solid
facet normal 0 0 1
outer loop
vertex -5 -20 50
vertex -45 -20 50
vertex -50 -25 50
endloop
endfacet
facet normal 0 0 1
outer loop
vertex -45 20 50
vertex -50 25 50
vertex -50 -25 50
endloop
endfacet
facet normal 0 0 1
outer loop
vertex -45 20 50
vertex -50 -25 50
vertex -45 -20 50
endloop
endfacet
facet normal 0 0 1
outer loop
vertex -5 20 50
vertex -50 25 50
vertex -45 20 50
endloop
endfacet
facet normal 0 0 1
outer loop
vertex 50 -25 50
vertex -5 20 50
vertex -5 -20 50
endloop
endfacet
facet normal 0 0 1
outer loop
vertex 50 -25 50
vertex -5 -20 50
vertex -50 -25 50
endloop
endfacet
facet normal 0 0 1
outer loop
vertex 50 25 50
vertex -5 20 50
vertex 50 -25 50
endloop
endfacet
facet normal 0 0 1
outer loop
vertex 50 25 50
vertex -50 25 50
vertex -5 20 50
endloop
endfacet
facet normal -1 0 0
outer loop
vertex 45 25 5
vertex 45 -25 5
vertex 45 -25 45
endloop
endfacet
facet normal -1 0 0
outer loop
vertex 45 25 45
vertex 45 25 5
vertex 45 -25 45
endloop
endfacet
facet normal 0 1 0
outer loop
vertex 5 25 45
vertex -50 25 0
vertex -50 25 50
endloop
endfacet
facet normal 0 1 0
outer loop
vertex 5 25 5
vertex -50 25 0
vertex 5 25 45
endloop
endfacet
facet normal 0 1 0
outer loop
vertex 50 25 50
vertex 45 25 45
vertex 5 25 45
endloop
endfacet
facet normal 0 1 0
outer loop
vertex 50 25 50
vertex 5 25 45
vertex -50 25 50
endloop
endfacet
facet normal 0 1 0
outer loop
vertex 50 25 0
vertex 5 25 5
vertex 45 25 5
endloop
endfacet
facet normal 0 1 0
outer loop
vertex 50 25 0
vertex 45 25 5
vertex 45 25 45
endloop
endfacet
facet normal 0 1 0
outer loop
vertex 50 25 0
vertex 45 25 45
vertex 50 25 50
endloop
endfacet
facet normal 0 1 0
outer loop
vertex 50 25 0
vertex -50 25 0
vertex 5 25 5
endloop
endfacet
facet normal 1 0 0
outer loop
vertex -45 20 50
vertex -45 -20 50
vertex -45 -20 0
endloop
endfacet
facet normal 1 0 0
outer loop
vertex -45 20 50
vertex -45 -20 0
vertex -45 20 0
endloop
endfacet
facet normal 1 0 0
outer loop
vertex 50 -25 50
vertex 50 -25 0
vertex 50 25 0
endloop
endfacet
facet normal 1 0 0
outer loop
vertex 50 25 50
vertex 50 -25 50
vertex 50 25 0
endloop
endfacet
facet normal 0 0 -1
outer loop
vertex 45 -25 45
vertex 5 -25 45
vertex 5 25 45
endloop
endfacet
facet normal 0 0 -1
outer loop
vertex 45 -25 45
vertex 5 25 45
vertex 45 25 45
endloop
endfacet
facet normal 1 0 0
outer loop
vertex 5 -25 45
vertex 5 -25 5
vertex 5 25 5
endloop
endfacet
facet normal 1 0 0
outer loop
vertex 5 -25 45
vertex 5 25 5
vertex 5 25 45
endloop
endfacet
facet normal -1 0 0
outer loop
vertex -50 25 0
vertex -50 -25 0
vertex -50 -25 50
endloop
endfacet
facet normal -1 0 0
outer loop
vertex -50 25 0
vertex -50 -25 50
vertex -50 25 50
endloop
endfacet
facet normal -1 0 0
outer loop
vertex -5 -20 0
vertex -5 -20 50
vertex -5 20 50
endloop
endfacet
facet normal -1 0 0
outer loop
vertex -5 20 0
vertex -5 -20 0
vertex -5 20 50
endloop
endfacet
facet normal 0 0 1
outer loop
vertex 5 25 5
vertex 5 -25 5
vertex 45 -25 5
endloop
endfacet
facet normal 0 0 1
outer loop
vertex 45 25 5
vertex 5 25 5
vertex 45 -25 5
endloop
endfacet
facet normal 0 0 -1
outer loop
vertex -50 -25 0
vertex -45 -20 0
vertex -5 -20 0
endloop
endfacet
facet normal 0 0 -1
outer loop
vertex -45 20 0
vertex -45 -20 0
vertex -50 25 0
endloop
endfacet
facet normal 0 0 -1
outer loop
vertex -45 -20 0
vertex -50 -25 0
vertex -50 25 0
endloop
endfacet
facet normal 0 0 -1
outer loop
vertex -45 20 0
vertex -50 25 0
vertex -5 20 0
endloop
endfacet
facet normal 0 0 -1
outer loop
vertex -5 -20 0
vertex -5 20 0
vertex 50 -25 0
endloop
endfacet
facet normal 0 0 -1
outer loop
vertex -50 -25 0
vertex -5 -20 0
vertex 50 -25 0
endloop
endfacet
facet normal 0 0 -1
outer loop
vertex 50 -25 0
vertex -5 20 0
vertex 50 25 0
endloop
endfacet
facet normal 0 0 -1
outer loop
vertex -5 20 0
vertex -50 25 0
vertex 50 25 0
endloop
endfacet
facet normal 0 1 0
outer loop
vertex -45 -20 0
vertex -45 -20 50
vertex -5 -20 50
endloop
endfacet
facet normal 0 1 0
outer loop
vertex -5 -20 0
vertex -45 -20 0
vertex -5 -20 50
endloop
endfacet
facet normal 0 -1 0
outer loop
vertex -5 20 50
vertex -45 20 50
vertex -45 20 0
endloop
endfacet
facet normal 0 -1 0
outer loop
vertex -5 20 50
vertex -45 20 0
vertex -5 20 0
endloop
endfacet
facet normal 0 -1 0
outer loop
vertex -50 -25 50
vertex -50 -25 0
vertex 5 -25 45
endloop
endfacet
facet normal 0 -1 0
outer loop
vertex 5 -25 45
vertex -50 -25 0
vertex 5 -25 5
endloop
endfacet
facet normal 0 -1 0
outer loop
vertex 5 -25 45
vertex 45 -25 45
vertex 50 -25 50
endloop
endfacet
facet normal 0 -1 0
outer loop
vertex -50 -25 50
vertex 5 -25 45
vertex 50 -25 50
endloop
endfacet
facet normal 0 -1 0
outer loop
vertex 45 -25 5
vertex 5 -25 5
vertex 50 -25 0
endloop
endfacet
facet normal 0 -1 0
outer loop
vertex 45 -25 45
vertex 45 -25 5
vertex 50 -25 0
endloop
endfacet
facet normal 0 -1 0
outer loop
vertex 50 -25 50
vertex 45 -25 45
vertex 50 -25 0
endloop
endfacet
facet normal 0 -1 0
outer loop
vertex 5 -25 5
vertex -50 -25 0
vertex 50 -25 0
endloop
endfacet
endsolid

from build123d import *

# Parameters (mm, degrees)
SKETCH1_W           = 100
SKETCH1_H           = 50
BOSS_EXTRUDE1_DEPTH = 50
CUT_EXTRUDE1_REACH  = 88.603
SKETCH2_W           = 40
SKETCH2_H           = 40
CUT_EXTRUDE2_REACH  = 77
SKETCH3_W           = 40
SKETCH3_H           = 40


with BuildPart() as part:
    # Sketch1 → Boss-Extrude1 (new body)
    with BuildSketch(Plane.XY):
        Rectangle(SKETCH1_W, SKETCH1_H)
    extrude(amount=BOSS_EXTRUDE1_DEPTH)

    # Sketch2 → Cut-Extrude1 (cut, up to next)
    with BuildSketch(Plane.XZ.offset(25), mode=Mode.PRIVATE) as cut_extrude1_sk1:
        with Locations((25, 25)):
            Rectangle(SKETCH2_W, SKETCH2_H)
    cut_extrude1_tool1 = extrude(cut_extrude1_sk1.sketch, amount=-CUT_EXTRUDE1_REACH, mode=Mode.PRIVATE) & part.part
    add(cut_extrude1_tool1.solids().sort_by_distance((25, -25, 25))[0], mode=Mode.SUBTRACT)

    # Sketch3 → Cut-Extrude2 (cut, up to next)
    with BuildSketch(Plane.XY.offset(50), mode=Mode.PRIVATE) as cut_extrude2_sk1:
        with Locations((-25, 0)):
            Rectangle(SKETCH3_W, SKETCH3_H)
    cut_extrude2_tool1 = extrude(cut_extrude2_sk1.sketch, amount=-CUT_EXTRUDE2_REACH, mode=Mode.PRIVATE) & part.part
    add(cut_extrude2_tool1.solids().sort_by_distance((-25, 0, 50))[0], mode=Mode.SUBTRACT)


solid = part.part
